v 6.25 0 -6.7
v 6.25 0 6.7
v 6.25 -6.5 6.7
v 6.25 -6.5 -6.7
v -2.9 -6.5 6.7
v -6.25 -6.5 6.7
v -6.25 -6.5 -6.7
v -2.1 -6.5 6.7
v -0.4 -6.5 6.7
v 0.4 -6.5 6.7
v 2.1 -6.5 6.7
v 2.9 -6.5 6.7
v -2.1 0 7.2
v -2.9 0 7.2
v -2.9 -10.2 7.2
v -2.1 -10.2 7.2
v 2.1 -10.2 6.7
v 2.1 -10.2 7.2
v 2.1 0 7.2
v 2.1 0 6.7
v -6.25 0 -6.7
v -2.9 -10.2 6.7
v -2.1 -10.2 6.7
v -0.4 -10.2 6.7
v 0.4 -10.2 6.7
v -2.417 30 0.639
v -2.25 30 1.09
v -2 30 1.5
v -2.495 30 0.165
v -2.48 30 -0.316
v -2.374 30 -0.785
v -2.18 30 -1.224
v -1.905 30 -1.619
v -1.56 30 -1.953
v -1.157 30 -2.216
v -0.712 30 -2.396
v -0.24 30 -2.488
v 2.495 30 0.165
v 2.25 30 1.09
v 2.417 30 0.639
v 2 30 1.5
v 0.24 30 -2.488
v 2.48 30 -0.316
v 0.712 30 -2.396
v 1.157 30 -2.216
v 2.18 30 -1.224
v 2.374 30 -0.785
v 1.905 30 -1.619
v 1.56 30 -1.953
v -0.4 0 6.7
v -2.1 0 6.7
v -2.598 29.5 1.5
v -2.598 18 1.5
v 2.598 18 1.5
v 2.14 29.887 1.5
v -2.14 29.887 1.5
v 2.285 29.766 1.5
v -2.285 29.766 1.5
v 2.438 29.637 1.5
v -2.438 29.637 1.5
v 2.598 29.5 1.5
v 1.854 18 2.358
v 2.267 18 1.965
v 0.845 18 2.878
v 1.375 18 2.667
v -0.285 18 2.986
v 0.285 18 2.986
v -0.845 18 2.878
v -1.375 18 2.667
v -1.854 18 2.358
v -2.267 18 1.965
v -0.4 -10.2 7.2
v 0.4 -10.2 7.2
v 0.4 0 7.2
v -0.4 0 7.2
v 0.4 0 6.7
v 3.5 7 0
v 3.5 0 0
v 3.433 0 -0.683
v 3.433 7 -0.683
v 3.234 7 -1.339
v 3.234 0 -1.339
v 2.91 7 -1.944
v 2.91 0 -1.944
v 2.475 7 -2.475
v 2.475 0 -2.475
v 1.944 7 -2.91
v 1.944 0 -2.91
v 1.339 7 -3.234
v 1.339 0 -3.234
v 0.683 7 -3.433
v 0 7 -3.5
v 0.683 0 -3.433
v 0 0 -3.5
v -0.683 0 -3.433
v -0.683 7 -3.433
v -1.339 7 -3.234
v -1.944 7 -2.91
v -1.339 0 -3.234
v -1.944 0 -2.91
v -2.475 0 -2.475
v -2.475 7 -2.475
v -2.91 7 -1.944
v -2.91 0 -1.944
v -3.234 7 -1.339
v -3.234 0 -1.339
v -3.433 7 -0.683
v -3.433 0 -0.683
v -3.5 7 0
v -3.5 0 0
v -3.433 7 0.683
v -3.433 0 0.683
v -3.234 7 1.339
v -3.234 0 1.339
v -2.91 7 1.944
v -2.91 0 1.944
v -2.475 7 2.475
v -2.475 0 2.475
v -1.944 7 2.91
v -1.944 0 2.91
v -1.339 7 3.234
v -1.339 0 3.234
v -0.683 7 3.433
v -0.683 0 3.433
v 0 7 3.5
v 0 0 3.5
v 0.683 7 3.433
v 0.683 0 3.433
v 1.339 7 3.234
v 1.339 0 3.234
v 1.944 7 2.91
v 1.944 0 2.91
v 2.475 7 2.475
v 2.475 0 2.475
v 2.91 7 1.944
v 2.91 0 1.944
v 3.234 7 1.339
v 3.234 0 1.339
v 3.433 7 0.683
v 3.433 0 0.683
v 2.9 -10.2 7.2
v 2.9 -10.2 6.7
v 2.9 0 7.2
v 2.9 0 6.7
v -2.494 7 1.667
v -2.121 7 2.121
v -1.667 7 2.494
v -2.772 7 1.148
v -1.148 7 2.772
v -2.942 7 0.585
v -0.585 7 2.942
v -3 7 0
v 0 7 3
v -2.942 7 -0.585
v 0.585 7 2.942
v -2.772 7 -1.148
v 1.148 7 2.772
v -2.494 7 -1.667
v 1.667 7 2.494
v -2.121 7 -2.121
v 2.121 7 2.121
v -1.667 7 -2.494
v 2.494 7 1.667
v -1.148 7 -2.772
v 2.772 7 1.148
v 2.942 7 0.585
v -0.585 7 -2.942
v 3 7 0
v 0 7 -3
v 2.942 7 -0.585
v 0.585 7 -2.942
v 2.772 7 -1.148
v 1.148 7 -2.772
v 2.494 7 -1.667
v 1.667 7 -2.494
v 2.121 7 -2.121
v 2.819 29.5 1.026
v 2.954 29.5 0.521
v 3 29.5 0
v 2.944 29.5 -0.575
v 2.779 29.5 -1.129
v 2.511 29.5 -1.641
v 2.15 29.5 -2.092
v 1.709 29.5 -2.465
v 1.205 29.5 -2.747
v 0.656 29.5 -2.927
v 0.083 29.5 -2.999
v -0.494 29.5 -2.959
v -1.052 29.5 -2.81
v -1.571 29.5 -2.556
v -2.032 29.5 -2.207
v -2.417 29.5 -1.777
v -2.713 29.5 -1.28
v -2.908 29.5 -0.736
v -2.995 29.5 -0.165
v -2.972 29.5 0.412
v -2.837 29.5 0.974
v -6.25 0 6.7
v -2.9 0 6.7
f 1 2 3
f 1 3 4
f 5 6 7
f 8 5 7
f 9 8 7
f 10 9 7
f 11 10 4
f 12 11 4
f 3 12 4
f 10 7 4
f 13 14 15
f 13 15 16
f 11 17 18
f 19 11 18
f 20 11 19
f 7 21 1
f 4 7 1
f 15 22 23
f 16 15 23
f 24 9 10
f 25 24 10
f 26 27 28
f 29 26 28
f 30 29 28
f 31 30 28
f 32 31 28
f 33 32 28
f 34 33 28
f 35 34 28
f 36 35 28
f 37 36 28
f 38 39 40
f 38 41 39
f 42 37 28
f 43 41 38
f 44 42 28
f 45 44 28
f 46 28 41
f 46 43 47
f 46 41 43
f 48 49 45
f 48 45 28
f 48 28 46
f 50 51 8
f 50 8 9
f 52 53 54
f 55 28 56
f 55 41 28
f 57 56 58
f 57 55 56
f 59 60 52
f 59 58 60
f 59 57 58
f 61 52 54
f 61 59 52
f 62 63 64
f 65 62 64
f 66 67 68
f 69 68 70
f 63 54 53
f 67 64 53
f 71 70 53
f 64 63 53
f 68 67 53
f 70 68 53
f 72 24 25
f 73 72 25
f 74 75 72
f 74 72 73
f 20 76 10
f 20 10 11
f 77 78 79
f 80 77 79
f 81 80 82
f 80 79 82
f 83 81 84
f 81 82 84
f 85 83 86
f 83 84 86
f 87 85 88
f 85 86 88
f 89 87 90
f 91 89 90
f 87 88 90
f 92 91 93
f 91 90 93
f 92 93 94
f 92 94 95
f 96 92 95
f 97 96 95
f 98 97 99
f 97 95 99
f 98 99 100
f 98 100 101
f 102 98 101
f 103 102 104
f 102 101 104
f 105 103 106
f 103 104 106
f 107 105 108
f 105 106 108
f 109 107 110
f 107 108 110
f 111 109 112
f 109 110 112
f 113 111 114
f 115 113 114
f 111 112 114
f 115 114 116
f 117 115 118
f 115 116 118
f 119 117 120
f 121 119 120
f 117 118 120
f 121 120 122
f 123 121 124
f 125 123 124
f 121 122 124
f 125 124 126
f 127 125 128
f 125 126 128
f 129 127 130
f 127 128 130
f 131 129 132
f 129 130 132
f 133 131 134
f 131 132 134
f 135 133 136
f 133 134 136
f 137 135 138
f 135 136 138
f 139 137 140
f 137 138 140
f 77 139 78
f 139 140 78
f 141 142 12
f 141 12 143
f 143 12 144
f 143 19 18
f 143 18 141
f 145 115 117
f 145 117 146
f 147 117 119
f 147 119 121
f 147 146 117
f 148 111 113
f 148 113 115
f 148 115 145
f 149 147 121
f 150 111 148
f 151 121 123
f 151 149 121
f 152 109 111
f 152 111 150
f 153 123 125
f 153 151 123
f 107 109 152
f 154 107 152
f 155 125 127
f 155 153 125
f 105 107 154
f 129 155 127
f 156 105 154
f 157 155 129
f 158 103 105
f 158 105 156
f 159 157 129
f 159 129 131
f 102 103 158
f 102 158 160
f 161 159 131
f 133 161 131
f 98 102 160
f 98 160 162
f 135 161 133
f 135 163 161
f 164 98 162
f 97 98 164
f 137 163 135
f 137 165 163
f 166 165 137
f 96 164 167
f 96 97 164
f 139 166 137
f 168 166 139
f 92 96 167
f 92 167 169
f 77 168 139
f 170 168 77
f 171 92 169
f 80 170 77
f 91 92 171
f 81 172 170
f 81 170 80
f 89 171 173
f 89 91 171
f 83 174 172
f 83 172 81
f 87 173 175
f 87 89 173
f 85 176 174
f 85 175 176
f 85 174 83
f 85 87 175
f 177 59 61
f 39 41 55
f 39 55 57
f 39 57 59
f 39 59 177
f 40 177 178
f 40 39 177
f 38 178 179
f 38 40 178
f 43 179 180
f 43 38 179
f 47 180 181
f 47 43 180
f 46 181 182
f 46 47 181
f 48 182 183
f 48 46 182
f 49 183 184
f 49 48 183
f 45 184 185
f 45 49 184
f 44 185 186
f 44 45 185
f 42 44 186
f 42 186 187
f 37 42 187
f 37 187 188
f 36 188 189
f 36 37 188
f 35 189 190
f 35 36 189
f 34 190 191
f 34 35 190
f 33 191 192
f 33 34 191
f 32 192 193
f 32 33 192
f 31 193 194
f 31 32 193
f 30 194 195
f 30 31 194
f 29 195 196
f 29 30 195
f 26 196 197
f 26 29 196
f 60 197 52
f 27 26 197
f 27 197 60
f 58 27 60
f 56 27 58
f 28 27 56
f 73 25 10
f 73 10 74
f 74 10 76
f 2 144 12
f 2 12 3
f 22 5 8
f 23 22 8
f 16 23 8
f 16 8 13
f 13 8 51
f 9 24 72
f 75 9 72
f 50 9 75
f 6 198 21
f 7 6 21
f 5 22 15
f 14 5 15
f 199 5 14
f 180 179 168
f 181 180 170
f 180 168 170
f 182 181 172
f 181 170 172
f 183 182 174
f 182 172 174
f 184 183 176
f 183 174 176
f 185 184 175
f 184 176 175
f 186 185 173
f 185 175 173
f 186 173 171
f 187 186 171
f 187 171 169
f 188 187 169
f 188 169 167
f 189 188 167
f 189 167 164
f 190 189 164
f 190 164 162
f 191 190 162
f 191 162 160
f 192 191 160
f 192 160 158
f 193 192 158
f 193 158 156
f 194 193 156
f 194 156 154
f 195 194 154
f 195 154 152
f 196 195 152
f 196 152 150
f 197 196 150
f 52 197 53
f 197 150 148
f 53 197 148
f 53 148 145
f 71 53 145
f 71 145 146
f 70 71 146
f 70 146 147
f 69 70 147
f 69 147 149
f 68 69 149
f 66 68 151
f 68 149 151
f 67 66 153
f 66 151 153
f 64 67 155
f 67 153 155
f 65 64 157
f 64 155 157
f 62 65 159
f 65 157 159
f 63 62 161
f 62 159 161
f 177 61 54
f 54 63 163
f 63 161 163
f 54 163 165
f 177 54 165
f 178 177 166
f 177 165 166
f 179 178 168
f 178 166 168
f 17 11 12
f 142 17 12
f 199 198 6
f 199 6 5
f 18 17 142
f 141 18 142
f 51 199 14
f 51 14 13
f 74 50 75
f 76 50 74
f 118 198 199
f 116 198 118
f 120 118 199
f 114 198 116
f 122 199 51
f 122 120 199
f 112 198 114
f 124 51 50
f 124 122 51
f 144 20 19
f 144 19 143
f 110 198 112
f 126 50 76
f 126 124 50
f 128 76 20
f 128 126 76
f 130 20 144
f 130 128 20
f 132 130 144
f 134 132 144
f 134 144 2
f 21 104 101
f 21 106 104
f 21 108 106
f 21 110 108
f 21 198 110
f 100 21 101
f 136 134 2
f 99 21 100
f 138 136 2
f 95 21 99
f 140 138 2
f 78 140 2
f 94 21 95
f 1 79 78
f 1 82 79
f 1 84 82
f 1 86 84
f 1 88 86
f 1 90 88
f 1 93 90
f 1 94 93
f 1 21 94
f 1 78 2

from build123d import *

# Parameters (mm, degrees)
SKETCH1_W           = 12.5
SKETCH1_H           = 13.4
BOSS_EXTRUDE1_DEPTH = 6.5
SKETCH2_R           = 3.5
BOSS_EXTRUDE2_DEPTH = 7
SKETCH3_R           = 3
BOSS_EXTRUDE3_DEPTH = 23
CHAMFER1_SIZE       = 0.5
CUT_EXTRUDE1_DEPTH  = 12
SKETCH5_W           = 0.8
SKETCH5_H           = 10.2
BOSS_EXTRUDE4_DEPTH = 0.5


with BuildPart() as part:
    # Sketch1 → Boss-Extrude1 (new body)
    with BuildSketch(Plane(origin=(0, 0, 0), x_dir=(1, 0, 0), z_dir=(0, 1, 0))):
        Rectangle(SKETCH1_W, SKETCH1_H)
    extrude(amount=-BOSS_EXTRUDE1_DEPTH)

    # Sketch2 → Boss-Extrude2 (add)
    with BuildSketch(Plane(origin=(0, 0, 0), x_dir=(1, 0, 0), z_dir=(0, 1, 0))):
        Circle(SKETCH2_R)
    extrude(amount=BOSS_EXTRUDE2_DEPTH)

    # Sketch3 → Boss-Extrude3 (add)
    with BuildSketch(Plane(origin=(0, 7, 0), x_dir=(1, 0, 0), z_dir=(0, 1, 0))):
        Circle(SKETCH3_R)
    extrude(amount=BOSS_EXTRUDE3_DEPTH)

    # Chamfer1
    chamfer1_edges = [part.edges().sort_by_distance(p)[0] for p in [
        (-3, 30, 0),
    ]]
    chamfer(chamfer1_edges, length=CHAMFER1_SIZE)

    # Sketch4 → Cut-Extrude1 (cut)
    with BuildSketch(Plane(origin=(0, 30, 0), x_dir=(1, 0, 0), z_dir=(0, 1, 0))):
        with BuildLine():
            Line((-2.598076211, -1.5), (2.598076211, -1.5))
            ThreePointArc((2.598076211, -1.5), (0, -3), (-2.598076211, -1.5))
        make_face()
    extrude(amount=-CUT_EXTRUDE1_DEPTH, mode=Mode.SUBTRACT)

    # Sketch5 → Boss-Extrude4 (add)
    with BuildSketch(Plane.XY.offset(6.7)):
        with Locations((-2.5, -5.1)):
            Rectangle(SKETCH5_W, SKETCH5_H)
        with Locations((0, -5.1)):
            Rectangle(SKETCH5_W, SKETCH5_H)
        with Locations((2.5, -5.1)):
            Rectangle(SKETCH5_W, SKETCH5_H)
    extrude(amount=BOSS_EXTRUDE4_DEPTH)


solid = part.part
